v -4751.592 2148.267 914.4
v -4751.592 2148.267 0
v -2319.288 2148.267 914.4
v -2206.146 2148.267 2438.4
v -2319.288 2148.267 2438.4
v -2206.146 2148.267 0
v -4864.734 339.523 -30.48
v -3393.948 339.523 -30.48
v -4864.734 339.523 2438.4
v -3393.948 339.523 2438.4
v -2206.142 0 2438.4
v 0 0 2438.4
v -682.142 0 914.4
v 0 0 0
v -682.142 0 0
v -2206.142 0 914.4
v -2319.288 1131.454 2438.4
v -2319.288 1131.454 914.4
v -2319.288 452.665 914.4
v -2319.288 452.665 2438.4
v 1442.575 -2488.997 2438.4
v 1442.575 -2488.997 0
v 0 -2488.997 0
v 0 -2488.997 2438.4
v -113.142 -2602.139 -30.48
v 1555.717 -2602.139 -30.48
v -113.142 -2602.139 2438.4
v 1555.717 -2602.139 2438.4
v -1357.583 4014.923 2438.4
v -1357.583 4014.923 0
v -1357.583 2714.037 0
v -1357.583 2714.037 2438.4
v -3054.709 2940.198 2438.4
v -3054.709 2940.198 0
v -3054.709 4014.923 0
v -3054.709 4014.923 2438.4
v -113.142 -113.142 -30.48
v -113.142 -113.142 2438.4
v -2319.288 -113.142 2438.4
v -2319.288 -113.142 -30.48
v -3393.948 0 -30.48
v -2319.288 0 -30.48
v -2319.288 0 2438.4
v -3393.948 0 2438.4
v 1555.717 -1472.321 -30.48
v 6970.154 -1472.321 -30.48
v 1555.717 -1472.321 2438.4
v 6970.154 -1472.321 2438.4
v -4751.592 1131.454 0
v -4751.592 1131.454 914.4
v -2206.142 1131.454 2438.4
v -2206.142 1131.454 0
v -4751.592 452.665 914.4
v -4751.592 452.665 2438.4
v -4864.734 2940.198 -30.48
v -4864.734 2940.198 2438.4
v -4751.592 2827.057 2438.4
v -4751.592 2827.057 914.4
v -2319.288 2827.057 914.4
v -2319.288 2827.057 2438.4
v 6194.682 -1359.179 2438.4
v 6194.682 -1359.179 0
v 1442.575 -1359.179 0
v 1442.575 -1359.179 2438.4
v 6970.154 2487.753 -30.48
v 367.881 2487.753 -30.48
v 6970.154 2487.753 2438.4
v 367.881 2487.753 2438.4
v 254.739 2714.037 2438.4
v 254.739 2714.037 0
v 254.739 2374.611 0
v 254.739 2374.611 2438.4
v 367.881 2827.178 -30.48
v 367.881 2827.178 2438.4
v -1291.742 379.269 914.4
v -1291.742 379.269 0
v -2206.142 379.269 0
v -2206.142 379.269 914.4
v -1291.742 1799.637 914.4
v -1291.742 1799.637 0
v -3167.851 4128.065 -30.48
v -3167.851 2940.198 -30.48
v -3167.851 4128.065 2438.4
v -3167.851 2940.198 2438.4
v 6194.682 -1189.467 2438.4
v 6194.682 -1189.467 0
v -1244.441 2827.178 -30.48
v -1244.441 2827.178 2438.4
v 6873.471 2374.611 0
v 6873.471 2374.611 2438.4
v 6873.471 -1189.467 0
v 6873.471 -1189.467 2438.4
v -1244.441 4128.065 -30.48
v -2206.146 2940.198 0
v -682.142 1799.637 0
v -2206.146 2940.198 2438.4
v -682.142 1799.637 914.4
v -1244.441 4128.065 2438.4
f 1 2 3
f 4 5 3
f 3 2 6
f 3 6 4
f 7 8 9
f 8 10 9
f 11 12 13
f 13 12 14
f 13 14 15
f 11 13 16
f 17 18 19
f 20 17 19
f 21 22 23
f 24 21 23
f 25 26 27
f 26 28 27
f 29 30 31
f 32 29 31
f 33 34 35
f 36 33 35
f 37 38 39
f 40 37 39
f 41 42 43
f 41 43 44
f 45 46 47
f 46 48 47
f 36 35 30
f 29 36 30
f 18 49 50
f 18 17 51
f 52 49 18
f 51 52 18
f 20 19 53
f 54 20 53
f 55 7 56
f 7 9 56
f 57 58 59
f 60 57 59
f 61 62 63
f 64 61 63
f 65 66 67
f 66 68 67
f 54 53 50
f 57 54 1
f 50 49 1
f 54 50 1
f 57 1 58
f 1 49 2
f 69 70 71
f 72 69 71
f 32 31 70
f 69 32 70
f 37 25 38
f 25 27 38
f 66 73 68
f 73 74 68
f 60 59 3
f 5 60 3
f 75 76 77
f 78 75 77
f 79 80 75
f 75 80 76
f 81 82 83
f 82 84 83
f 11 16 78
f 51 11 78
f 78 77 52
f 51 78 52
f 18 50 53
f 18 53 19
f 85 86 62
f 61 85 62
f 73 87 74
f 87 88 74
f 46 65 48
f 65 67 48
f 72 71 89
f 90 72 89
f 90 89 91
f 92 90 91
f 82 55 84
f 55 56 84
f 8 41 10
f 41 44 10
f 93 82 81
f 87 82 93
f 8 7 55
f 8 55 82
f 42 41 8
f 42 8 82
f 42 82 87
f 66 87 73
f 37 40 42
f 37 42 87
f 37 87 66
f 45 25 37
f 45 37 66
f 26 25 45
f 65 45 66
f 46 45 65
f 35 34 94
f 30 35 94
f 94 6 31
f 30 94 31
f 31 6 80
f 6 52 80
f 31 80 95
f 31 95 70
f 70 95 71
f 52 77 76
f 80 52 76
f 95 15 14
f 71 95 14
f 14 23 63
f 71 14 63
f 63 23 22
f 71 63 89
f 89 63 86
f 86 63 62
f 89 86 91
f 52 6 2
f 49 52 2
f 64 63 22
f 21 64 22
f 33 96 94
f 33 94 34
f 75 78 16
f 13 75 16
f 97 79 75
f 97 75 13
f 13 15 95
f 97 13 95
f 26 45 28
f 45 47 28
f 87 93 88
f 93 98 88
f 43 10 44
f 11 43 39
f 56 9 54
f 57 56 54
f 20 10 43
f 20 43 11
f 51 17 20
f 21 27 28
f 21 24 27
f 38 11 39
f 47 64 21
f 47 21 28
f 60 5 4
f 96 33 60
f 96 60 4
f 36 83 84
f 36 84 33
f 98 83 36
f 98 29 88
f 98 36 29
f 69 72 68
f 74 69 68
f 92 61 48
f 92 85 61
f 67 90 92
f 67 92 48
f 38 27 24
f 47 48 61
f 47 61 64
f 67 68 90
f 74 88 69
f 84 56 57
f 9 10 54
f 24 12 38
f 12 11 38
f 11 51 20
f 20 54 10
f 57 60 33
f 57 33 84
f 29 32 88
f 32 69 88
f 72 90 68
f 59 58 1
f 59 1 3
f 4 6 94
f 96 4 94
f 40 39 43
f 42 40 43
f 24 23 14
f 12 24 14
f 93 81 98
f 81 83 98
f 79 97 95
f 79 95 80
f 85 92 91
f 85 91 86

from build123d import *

# Parameters (mm, degrees)
F1_DEPTH = 2438.4
F3_DEPTH = 30.48
F4_W     = 2432.304
F4_H     = 678.7896
F5_DEPTH = 914.4
F7_DEPTH = 914.4


with BuildPart() as f1:
    # F0 (on Top) → F1 (new body)
    with BuildSketch(Plane.XY):
        Polygon((0, -2488.9968), (0, 0), (-2206.1424, 0), (-2319.287818, 0), (-2319.287818, -113.14176), (-113.14176, -113.14176), (-113.14176, -2602.13856), (1555.717183, -2602.13856), (1555.717183, -1472.32116), (6970.153903, -1472.32116), (6970.153903, 2487.753216), (367.881103, 2487.753216), (367.881103, 2827.178496), (-1244.441098, 2827.178496), (-1244.441098, 4128.064896), (-3167.851018, 4128.064896), (-3167.851018, 2940.198336), (-3054.709258, 2940.198336), (-3054.709258, 4014.923136), (-1357.582858, 4014.923136), (-1357.582858, 2714.036736), (254.739343, 2714.036736), (254.739343, 2374.611456), (6873.471343, 2374.611456), (6873.471343, -1189.46676), (6194.681743, -1189.46676), (6194.681743, -1359.1794), (1442.575423, -1359.1794), (1442.575423, -2488.9968), align=None)
        Polygon((-2319.287818, 0), (-2206.1424, 0), (-2206.1424, 1131.454176), (-2319.287818, 1131.454176), (-2319.287818, 452.664576), (-4751.591818, 452.664576), (-4751.591818, 1131.454176), (-4751.591818, 2148.266976), (-4751.591818, 2827.056576), (-2319.287818, 2827.056576), (-2319.287818, 2148.266976), (-2206.146058, 2148.266976), (-2206.146058, 2940.198336), (-3054.709258, 2940.198336), (-3167.851018, 2940.198336), (-4864.733578, 2940.198336), (-4864.733578, 339.522816), (-3393.948, 339.522816), (-3393.948, 0), align=None)
    extrude(amount=F1_DEPTH)

    # F2 (on face) → F3 (join)
    with BuildSketch(Plane(origin=(0, 0, 0), x_dir=(1, 0, 0), z_dir=(0, 0, -1))):
        Polygon((-2319.287818, 0), (-3393.948, 0), (-3393.948, -339.522816), (-4864.733578, -339.522816), (-4864.733578, -2940.198336), (-3167.851018, -2940.198336), (-3167.851018, -4128.064896), (-1244.441098, -4128.064896), (-1244.441098, -2827.178496), (367.881103, -2827.178496), (367.881103, -2487.753216), (6970.153903, -2487.753216), (6970.153903, 1472.32116), (1555.717183, 1472.32116), (1555.717183, 2602.13856), (-113.14176, 2602.13856), (-113.14176, 113.14176), (-2319.287818, 113.14176), align=None)
    extrude(amount=F3_DEPTH)

    # F4 (on face) → F5 (join)
    with BuildSketch(Plane.XY):
        with Locations((-3535.439818, 792.059376)):
            Rectangle(F4_W, F4_H)
        with Locations((-3535.439818, 2487.661776)):
            Rectangle(F4_W, F4_H)
    extrude(amount=F5_DEPTH)

    # F6 (on face) → F7 (join)
    with BuildSketch(Plane.XY):
        Polygon((-682.1424, 1799.636736), (-1291.7424, 1799.636736), (-1291.7424, 379.268736), (-2206.1424, 379.268736), (-2206.1424, 0), (-682.1424, 0), align=None)
    extrude(amount=F7_DEPTH)


solid = f1.part
